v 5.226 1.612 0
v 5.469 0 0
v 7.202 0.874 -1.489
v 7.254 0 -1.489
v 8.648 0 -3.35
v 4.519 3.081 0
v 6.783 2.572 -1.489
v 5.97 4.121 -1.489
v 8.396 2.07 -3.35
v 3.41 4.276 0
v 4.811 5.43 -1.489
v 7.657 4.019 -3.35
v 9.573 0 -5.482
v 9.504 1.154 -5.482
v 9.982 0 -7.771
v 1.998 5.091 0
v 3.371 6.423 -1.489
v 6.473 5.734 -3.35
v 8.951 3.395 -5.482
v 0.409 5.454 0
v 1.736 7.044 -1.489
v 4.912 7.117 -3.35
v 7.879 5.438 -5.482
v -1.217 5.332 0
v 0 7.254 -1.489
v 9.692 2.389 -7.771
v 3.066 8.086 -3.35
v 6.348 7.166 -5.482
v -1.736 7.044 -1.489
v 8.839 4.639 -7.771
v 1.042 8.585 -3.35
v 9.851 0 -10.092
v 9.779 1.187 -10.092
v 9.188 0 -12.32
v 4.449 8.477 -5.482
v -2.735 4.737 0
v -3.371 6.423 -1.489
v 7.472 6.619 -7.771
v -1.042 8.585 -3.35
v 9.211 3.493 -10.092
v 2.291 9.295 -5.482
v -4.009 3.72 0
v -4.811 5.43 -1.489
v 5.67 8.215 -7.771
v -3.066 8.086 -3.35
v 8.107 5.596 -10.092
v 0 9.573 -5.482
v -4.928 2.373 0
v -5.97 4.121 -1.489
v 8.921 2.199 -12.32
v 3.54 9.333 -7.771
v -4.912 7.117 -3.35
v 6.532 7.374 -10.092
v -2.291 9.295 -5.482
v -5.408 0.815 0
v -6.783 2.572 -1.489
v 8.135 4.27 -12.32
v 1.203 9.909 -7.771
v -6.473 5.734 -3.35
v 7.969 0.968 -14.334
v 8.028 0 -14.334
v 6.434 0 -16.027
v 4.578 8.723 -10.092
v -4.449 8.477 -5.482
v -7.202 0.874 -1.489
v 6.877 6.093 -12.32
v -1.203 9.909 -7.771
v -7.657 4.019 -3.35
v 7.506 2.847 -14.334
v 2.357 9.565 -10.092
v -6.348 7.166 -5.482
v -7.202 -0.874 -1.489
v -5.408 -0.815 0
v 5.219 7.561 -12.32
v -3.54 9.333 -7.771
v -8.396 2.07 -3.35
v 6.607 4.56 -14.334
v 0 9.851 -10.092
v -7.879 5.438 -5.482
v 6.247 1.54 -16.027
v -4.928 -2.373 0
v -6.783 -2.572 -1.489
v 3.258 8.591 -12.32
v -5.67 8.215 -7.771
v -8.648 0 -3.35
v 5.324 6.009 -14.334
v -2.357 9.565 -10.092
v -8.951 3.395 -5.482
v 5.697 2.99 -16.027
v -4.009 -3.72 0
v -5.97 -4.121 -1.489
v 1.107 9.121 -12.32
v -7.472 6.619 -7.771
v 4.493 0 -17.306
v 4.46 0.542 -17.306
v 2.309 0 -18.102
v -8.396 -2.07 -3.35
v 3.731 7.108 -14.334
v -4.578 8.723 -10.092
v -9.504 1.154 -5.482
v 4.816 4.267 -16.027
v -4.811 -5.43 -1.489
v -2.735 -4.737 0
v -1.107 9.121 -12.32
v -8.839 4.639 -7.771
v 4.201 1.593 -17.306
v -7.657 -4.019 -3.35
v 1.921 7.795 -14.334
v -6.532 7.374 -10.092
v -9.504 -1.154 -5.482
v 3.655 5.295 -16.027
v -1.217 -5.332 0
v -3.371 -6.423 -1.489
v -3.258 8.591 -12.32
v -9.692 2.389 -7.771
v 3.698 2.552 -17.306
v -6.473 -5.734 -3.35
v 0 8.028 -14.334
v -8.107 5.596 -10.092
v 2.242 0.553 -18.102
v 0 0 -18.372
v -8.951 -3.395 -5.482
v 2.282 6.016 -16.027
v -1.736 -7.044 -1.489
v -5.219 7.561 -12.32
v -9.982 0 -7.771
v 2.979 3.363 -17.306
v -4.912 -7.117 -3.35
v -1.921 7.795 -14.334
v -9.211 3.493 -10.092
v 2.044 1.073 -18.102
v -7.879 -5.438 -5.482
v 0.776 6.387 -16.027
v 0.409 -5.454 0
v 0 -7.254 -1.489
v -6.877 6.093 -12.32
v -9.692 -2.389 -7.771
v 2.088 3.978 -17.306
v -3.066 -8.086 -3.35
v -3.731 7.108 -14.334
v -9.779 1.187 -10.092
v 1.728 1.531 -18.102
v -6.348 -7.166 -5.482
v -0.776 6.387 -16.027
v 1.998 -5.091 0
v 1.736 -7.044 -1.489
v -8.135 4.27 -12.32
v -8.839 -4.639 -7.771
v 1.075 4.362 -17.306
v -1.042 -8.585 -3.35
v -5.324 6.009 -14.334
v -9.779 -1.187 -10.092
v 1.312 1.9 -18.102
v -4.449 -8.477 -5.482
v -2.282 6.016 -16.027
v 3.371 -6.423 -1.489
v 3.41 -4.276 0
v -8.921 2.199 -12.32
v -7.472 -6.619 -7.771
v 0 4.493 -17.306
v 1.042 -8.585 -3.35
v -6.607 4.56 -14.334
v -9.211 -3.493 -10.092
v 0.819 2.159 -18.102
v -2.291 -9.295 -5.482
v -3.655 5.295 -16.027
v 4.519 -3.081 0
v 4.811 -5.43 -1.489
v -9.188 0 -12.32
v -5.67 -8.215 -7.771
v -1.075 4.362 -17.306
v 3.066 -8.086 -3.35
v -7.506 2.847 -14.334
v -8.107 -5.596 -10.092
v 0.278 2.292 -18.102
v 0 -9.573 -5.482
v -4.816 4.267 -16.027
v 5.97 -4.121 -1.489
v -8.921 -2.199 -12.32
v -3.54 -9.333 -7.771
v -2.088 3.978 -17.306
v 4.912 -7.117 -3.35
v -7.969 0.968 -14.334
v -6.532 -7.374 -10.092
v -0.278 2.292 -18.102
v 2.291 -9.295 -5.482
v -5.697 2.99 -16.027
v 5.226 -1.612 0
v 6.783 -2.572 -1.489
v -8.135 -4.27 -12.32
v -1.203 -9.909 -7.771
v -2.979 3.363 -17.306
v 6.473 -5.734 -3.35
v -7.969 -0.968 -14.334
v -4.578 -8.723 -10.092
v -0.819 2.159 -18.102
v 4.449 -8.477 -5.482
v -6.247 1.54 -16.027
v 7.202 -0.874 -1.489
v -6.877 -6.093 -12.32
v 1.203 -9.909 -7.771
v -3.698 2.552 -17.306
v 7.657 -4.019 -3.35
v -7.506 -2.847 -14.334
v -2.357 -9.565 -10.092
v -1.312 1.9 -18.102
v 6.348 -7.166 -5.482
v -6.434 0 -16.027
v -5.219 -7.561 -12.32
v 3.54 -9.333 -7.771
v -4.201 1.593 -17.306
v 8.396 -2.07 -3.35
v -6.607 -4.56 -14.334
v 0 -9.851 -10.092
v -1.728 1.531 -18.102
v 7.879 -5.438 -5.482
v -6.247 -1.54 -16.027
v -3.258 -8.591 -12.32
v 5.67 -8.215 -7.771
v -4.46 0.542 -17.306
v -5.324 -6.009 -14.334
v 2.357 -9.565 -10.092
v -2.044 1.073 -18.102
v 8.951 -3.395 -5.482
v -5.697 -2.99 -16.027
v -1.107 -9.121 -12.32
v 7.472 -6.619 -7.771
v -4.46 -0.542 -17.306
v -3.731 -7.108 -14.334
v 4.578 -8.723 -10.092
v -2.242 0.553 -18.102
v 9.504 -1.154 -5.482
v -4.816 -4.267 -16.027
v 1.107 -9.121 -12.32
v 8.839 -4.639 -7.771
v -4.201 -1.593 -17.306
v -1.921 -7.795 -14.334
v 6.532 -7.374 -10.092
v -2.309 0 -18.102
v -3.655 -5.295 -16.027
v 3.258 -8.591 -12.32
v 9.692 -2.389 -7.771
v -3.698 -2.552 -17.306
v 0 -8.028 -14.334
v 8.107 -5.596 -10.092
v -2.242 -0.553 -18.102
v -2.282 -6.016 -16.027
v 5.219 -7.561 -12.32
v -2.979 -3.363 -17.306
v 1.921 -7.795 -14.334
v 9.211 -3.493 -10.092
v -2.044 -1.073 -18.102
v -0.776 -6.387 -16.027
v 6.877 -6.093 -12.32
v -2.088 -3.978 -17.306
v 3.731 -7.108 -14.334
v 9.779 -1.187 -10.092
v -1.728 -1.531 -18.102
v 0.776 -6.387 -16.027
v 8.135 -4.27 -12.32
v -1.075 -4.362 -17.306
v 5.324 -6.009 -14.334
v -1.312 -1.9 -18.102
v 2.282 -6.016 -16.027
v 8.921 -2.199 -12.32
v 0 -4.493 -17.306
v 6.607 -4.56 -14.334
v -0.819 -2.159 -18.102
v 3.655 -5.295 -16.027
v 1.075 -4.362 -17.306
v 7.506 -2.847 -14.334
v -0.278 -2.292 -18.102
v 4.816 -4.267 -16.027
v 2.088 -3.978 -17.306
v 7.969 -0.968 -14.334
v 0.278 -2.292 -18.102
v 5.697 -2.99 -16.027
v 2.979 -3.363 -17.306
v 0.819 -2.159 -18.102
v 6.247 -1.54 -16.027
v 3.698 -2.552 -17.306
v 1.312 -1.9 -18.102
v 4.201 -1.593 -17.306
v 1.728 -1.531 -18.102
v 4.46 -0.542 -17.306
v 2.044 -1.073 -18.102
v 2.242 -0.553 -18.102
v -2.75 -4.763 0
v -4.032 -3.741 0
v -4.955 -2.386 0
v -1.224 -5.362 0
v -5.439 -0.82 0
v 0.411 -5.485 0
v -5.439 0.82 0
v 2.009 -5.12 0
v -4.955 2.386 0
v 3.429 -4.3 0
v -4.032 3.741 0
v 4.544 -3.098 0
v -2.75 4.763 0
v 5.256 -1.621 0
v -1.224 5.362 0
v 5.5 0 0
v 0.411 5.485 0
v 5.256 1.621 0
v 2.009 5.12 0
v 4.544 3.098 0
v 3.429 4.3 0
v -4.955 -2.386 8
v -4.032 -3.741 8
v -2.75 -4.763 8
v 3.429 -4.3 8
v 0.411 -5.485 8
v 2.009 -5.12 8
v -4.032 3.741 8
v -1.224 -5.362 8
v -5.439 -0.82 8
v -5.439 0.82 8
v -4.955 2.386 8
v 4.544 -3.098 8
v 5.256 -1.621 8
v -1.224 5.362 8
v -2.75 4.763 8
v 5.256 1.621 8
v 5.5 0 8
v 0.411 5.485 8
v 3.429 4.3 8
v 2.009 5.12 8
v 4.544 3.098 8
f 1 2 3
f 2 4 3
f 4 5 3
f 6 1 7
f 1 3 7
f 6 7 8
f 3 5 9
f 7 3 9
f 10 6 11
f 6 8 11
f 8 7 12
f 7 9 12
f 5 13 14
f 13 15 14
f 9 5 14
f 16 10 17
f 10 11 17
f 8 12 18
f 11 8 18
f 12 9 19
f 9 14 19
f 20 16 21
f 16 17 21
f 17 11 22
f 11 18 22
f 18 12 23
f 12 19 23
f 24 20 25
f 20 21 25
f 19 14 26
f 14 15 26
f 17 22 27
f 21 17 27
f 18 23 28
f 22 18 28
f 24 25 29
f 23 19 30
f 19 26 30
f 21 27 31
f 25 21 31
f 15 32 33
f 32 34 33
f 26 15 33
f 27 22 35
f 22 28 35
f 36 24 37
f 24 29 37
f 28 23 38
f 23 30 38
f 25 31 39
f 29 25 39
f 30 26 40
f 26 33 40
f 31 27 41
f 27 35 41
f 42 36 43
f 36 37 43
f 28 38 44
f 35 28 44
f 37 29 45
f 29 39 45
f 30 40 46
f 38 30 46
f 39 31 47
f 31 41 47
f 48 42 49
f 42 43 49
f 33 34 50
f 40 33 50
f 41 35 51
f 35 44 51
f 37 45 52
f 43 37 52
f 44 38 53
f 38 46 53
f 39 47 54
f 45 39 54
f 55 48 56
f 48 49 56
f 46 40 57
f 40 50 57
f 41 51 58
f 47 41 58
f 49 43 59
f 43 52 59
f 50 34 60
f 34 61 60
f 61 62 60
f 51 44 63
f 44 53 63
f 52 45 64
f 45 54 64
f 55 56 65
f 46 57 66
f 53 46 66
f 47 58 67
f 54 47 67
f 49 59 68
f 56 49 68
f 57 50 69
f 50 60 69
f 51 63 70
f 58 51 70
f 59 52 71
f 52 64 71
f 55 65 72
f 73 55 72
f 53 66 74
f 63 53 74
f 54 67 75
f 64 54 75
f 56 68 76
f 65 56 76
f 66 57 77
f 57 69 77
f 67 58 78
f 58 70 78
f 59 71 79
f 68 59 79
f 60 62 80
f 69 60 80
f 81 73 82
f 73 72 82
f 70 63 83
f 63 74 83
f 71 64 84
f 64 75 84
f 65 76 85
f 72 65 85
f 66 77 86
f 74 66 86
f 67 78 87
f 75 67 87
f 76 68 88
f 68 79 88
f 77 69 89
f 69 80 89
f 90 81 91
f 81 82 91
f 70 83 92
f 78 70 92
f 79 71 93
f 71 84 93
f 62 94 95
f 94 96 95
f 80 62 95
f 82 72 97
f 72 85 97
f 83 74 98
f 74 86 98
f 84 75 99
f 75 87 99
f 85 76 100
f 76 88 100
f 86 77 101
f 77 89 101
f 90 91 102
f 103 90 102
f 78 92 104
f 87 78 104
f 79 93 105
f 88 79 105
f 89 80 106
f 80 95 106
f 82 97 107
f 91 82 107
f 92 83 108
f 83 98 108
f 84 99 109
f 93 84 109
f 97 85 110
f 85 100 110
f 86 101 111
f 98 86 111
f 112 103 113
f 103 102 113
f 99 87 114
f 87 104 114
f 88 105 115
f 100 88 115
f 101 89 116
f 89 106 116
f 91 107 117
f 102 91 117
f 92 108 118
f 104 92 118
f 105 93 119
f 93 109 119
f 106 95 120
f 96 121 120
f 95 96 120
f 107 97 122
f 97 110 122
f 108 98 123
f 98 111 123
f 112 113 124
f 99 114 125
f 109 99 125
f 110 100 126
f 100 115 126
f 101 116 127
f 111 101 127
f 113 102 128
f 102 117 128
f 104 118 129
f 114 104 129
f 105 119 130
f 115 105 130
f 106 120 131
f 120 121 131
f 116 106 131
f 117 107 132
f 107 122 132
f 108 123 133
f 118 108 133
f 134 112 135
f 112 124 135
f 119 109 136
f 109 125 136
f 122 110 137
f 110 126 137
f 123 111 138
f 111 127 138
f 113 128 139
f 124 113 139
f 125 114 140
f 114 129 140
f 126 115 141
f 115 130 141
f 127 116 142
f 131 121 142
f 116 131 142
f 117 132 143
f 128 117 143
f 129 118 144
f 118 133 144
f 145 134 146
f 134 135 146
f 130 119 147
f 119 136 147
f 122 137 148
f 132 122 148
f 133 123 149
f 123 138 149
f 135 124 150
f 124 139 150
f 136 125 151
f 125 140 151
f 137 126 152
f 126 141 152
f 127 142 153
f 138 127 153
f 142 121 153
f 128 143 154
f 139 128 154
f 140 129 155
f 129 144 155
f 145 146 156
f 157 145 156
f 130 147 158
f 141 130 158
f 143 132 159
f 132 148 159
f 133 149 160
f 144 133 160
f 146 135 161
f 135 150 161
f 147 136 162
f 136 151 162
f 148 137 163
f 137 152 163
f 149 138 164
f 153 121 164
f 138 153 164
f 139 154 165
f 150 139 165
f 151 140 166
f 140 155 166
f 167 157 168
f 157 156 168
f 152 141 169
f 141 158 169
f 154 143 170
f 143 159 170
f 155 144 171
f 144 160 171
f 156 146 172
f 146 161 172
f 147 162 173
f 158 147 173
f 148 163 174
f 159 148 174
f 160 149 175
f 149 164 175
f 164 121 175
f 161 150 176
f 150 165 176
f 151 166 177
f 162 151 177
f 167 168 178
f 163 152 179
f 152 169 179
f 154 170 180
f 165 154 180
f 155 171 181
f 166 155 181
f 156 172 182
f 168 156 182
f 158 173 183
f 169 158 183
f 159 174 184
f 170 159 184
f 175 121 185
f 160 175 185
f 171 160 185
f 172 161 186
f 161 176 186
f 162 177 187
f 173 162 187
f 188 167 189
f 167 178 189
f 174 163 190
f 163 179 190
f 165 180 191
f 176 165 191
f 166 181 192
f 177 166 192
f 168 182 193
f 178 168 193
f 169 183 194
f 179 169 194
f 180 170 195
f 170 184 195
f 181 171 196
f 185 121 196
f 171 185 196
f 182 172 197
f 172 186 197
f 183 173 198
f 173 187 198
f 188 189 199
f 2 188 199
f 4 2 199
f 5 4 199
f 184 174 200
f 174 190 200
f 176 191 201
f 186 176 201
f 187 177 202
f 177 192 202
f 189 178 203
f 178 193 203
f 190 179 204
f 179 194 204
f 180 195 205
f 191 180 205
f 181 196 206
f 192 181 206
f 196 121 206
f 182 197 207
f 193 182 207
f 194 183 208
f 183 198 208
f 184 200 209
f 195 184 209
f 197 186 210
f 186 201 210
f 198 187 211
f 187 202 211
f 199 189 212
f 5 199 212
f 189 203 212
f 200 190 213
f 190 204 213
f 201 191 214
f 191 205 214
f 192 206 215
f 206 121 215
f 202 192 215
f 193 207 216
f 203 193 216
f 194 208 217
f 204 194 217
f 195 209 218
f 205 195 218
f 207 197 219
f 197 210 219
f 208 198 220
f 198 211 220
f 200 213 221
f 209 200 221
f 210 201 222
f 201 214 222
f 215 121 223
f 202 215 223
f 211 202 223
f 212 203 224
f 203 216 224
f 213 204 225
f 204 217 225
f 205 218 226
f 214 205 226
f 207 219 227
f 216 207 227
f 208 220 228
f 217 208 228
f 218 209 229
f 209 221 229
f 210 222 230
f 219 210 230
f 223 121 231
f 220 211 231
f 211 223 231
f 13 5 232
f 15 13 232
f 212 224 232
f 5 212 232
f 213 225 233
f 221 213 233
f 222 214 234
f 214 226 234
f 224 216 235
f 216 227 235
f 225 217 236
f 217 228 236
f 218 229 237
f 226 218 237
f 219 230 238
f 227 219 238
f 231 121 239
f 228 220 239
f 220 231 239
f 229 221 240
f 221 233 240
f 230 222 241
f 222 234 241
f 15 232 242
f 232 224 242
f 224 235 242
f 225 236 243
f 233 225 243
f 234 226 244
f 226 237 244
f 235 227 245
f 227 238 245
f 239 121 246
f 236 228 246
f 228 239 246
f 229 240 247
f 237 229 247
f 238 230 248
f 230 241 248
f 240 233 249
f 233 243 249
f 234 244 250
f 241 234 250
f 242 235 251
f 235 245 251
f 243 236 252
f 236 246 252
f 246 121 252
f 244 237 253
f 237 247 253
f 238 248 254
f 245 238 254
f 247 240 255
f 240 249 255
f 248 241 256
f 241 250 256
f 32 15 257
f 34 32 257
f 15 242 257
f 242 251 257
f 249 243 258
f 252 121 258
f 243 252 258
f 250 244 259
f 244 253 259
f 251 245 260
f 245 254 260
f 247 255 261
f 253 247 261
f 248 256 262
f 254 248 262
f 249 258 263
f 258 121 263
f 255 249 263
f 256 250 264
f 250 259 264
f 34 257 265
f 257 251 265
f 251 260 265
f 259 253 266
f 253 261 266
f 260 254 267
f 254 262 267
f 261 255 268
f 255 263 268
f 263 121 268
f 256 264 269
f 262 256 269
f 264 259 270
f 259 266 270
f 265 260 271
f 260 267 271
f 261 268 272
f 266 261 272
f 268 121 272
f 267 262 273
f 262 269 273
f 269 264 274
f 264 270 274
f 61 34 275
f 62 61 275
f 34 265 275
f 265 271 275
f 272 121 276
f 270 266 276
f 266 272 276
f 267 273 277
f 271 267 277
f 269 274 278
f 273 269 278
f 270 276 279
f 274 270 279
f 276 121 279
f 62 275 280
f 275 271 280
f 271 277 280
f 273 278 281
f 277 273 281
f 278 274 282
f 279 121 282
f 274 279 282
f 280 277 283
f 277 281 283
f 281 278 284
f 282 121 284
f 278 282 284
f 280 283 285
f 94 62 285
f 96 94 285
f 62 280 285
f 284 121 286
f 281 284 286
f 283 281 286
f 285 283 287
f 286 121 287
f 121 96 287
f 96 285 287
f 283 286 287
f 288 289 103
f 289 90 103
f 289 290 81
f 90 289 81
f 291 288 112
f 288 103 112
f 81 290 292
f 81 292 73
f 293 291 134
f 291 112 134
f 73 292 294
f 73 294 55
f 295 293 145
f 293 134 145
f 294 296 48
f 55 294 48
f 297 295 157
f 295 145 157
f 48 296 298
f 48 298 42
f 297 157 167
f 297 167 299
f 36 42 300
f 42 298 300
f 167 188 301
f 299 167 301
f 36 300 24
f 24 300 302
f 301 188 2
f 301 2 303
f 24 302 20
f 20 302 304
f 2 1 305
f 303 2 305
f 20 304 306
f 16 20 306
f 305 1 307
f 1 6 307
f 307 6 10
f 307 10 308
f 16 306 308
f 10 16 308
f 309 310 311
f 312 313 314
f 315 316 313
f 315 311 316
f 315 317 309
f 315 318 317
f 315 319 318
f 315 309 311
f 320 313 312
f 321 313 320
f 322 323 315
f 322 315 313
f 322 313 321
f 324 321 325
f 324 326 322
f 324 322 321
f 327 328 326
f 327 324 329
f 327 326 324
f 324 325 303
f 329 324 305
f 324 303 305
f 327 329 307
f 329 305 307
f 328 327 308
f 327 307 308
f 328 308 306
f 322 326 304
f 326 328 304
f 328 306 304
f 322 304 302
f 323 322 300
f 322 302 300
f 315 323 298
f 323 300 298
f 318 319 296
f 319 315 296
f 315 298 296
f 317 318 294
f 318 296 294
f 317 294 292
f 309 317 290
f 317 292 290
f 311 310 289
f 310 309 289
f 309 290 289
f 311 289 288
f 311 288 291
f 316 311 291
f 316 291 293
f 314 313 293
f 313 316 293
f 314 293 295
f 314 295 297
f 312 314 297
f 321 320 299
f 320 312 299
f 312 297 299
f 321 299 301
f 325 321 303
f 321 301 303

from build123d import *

# Parameters (mm, degrees)
SKETCH_1_R          = 5.5
EXTRUDE_1_DEPTH     = 15
SKETCH_3_R          = 7.159544481
CUT_EXTRUDE_1_DEPTH = 7


with BuildPart() as part:
    # 스케치1 → 보스-돌출1 (new body)
    with BuildSketch(Plane.XY):
        Circle(SKETCH_1_R)
    extrude(amount=EXTRUDE_1_DEPTH)

    # 스케치2 → 회전1 (revolve)
    with BuildSketch(Plane(origin=(0, 0, 0), x_dir=(1, 0, 0), z_dir=(0, 1, 0)), mode=Mode.PRIVATE) as revolve_1_sk:
        with BuildLine():
            Line((0, 18.371801754), (0, 0))
            Line((0, 0), (-5.469271925, 0))
            ThreePointArc((-5.469271925, 0), (-9.584310553, 11.225043985), (0, 18.371801754))
        make_face()
    revolve(revolve_1_sk.sketch.rotate(Axis((0, 0, -18.371801754), (0, 0, 1)), 180), axis=Axis((0, 0, -18.371801754), (0, 0, 1)))

    # 스케치3 → 컷-돌출1 (cut)
    with BuildSketch(Plane.XY.offset(15)):
        Circle(SKETCH_3_R)
    extrude(amount=-CUT_EXTRUDE_1_DEPTH, mode=Mode.SUBTRACT)


solid = part.part
